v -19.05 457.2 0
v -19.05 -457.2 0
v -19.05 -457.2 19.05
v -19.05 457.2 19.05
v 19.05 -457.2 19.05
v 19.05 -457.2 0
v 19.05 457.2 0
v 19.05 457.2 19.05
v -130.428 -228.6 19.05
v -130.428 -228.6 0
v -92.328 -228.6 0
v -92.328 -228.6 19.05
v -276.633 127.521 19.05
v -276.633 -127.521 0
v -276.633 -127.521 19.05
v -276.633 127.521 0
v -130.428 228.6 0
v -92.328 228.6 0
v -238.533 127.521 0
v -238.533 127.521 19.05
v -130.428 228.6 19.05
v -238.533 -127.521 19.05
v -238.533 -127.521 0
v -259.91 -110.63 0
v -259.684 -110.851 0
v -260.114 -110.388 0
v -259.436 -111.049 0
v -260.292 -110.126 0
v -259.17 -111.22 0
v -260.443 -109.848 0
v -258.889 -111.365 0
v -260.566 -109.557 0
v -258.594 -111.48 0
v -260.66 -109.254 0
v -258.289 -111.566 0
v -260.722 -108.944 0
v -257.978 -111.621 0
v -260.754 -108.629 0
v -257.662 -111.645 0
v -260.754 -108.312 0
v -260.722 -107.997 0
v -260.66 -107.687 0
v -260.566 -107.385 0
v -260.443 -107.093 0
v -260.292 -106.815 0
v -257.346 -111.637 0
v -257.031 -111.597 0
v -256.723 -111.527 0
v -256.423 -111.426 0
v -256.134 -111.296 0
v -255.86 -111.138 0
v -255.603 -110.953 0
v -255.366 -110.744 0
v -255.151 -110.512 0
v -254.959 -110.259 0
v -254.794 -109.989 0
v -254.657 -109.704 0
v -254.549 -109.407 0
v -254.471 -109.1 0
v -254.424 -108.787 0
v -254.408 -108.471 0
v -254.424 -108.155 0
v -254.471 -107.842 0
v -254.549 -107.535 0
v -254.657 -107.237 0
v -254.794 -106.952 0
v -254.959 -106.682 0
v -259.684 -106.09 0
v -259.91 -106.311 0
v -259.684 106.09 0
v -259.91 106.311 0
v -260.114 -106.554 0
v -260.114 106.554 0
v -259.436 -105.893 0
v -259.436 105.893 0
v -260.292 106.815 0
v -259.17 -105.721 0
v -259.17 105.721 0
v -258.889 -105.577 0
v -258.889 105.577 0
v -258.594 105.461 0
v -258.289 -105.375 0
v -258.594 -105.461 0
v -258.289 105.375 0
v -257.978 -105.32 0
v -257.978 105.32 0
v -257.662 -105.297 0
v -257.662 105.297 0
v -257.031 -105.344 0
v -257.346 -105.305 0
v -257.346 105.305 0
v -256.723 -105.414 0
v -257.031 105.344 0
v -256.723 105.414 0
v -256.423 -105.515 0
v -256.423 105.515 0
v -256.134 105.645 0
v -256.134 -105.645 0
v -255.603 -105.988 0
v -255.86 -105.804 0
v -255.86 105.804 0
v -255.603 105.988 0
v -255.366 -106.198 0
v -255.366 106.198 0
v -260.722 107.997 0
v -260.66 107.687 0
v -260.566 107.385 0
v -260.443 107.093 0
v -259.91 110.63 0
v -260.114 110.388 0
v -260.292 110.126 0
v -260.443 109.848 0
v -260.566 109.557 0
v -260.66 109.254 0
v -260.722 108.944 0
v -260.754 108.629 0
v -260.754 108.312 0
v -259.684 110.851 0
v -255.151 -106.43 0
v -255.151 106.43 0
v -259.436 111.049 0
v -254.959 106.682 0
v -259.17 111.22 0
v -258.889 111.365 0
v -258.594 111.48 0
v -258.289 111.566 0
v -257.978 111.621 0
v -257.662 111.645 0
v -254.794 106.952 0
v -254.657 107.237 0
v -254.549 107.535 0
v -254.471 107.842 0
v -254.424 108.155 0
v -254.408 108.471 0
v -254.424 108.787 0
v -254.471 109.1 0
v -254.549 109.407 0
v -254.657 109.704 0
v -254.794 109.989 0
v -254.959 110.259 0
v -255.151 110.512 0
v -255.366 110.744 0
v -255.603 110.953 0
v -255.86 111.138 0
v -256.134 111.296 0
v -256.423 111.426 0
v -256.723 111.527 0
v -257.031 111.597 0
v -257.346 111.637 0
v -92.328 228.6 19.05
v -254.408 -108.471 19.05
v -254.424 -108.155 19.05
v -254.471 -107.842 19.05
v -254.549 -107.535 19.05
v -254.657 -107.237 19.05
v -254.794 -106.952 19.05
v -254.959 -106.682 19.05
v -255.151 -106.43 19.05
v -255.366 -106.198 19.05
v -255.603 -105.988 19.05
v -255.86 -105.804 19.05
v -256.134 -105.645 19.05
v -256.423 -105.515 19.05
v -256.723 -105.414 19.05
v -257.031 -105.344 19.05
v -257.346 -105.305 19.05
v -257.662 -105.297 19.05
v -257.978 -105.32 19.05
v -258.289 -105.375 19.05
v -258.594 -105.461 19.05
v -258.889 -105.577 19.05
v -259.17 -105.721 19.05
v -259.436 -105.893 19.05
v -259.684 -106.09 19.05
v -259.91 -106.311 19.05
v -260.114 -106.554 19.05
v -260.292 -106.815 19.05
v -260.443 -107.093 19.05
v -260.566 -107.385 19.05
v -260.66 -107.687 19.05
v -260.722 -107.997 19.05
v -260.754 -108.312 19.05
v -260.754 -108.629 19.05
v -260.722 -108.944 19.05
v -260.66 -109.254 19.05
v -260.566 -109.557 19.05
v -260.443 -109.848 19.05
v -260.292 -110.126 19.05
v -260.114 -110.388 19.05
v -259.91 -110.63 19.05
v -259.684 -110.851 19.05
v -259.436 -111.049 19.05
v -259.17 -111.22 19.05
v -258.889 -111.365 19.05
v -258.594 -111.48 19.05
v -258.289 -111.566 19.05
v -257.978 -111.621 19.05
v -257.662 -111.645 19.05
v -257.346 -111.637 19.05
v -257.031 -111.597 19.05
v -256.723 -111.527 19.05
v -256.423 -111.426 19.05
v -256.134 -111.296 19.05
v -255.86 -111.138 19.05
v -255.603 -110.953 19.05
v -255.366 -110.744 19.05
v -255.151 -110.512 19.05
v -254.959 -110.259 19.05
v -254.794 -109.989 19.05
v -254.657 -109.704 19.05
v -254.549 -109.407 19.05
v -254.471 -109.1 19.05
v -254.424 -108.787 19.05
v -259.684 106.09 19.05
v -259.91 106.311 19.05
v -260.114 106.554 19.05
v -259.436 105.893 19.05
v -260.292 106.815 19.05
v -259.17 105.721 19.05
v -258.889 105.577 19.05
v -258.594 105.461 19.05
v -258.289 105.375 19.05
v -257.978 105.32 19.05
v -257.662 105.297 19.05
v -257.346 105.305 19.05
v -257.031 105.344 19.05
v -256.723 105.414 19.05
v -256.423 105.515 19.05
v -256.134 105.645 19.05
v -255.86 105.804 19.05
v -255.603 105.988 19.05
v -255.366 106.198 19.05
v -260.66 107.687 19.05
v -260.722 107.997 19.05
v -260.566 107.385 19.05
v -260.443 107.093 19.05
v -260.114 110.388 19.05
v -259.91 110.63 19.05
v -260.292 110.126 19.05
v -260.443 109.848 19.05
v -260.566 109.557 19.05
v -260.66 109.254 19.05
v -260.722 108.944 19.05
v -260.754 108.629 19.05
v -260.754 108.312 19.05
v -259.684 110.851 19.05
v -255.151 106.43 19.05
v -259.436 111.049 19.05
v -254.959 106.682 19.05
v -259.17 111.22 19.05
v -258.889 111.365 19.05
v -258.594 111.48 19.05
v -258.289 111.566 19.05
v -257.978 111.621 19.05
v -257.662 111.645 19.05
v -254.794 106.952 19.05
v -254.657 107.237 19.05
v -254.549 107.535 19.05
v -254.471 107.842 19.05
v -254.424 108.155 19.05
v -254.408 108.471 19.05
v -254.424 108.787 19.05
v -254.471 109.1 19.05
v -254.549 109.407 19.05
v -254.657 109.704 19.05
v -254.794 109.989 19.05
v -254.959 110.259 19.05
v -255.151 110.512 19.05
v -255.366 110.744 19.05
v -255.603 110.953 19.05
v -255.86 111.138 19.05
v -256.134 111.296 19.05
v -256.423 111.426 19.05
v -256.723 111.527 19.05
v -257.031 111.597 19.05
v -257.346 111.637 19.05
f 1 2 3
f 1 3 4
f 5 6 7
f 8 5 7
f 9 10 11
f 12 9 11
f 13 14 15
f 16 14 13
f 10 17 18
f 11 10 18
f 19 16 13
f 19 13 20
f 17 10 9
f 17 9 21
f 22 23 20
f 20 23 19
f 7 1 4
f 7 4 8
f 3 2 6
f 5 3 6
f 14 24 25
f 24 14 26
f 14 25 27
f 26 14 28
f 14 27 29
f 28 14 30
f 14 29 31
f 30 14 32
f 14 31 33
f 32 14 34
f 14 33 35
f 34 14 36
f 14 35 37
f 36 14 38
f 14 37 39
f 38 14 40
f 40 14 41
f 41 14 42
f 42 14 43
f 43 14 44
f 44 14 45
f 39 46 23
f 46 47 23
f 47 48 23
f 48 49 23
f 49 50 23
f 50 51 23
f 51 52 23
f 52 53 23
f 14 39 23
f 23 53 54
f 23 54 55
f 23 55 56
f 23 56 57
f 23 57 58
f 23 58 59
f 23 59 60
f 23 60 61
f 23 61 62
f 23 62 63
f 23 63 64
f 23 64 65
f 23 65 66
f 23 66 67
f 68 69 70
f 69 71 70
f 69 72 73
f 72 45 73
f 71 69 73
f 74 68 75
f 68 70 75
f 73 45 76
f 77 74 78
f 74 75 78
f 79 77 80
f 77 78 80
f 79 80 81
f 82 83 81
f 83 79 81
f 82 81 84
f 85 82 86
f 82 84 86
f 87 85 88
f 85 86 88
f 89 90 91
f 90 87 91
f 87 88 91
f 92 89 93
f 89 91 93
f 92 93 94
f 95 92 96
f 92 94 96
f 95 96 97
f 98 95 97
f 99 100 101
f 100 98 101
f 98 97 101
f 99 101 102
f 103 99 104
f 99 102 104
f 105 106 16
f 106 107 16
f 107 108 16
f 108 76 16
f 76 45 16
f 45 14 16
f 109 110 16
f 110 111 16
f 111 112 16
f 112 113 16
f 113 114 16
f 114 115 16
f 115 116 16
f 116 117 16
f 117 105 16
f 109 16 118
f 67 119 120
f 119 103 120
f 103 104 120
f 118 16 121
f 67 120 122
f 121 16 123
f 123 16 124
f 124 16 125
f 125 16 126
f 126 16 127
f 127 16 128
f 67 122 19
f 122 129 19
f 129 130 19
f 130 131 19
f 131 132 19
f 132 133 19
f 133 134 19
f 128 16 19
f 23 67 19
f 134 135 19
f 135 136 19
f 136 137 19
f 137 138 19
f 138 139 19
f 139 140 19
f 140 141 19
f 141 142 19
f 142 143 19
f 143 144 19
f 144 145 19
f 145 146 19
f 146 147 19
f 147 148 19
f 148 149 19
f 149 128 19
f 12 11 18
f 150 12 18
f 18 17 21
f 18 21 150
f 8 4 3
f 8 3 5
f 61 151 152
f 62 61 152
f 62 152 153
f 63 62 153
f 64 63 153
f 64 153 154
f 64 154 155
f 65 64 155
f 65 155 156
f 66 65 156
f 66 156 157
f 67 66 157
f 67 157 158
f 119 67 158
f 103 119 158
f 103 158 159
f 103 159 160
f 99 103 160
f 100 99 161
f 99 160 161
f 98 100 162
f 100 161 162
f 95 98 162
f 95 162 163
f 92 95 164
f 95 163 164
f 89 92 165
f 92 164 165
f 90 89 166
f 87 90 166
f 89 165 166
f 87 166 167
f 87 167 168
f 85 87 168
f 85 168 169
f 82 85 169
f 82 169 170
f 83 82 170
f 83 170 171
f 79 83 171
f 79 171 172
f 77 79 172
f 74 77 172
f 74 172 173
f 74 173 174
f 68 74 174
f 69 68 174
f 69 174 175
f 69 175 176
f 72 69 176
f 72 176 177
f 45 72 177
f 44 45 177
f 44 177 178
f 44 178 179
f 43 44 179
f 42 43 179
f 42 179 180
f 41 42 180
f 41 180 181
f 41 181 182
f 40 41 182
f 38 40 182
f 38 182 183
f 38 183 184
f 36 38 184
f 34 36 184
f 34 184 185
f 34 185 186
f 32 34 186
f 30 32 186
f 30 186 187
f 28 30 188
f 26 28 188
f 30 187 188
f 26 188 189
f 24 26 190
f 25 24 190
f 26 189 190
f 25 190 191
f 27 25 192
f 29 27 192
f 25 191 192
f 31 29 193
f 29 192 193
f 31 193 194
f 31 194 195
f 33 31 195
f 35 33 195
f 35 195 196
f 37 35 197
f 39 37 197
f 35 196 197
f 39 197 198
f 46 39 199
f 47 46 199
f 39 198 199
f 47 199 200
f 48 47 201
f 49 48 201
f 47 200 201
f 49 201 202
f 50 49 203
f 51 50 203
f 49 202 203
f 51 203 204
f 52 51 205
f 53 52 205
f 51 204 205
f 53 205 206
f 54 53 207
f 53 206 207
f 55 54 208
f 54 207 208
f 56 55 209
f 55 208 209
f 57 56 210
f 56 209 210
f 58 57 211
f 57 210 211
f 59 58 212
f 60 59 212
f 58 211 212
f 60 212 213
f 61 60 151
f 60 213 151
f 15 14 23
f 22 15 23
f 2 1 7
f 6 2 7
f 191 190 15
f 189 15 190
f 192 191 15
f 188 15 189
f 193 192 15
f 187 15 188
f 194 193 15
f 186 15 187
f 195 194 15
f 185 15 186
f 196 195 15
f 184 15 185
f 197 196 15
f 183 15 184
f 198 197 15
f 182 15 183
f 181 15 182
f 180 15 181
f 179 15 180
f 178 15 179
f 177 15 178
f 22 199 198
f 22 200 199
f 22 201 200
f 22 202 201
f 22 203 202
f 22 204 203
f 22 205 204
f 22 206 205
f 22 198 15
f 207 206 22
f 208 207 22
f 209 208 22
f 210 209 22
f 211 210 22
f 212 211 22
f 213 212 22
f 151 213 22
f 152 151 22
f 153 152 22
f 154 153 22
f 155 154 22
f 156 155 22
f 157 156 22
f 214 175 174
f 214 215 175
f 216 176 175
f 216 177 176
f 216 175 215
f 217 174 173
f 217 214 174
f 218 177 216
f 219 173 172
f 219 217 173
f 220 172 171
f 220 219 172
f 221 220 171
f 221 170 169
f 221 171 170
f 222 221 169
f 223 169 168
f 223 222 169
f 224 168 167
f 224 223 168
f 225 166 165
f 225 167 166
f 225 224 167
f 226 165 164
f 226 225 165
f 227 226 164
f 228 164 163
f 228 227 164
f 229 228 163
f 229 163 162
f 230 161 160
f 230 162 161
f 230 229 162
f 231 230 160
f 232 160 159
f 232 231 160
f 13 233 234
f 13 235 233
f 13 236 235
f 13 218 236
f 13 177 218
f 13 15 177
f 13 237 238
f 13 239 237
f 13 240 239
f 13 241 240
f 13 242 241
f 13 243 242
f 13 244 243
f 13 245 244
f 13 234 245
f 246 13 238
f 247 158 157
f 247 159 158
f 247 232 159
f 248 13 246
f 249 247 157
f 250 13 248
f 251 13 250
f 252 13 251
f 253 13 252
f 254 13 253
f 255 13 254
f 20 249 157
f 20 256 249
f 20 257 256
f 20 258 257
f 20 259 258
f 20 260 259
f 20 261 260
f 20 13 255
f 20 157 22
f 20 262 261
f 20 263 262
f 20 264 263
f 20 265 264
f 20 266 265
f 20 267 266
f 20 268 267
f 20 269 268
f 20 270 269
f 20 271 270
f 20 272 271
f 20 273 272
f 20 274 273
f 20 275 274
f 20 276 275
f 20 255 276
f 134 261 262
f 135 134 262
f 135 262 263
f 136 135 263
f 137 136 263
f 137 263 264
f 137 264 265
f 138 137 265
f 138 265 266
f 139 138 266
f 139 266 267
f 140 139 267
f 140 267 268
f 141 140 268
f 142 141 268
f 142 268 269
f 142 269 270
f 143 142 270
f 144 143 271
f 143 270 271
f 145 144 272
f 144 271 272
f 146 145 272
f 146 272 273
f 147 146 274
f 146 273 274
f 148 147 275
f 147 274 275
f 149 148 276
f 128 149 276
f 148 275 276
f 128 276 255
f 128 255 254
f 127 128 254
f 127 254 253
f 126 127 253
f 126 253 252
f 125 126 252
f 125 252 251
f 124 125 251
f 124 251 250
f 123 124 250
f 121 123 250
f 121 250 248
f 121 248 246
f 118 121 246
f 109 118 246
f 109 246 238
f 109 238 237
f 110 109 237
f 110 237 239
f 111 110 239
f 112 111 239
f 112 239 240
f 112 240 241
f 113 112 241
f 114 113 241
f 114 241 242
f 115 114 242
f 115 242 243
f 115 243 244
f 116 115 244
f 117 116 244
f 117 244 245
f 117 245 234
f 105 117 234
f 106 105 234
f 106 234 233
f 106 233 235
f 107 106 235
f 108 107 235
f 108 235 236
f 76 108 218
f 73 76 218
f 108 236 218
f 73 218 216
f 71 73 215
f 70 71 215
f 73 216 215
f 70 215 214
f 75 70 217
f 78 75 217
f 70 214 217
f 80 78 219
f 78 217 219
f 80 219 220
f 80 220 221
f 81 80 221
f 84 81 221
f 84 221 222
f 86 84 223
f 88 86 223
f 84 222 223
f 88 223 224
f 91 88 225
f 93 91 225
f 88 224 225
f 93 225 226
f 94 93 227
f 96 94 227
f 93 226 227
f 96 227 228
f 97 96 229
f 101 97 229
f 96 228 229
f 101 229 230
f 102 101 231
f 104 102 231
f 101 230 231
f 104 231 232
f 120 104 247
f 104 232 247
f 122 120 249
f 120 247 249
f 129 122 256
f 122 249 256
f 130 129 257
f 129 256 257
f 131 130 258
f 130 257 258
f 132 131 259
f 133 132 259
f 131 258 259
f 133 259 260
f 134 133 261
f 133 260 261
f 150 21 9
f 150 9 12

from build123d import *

# Parameters (mm, degrees)
F0_W     = 38.1
F0_H     = 914.4
F1_DEPTH = 19.05
F2_W     = 38.1
F2_H     = 457.2
F3_DEPTH = 19.05
F5_W     = 38.1
F5_H     = 255.0414
F6_DEPTH = 19.05
F7_R     = 3.175
F8_DEPTH = 19.051


with BuildPart() as f1:
    # F0 (on Top) → F1 (new body)
    with BuildSketch(Plane.XY):
        Rectangle(F0_W, F0_H)
    extrude(amount=F1_DEPTH)


with BuildPart() as f3:
    # F2 (on Top) → F3 (new body)
    with BuildSketch(Plane.XY):
        with Locations((-111.377722, 0)):
            Rectangle(F2_W, F2_H)
    extrude(amount=F3_DEPTH)


with BuildPart() as f6:
    # F5 (on Top) → F6 (new body)
    with BuildSketch(Plane.XY):
        with Locations((-257.582774, 0)):
            Rectangle(F5_W, F5_H)
    extrude(amount=F6_DEPTH)

    # F7 (on face) → F8 (cut, through all)
    with BuildSketch(Plane.XY.offset(19.05)):
        with Locations((-257.582774, 108.4707)):
            Circle(F7_R)
        with Locations((-257.582774, -108.4707)):
            Circle(F7_R)
    extrude(amount=-F8_DEPTH, mode=Mode.SUBTRACT)


solid = Compound([f1.part, f3.part, f6.part])
